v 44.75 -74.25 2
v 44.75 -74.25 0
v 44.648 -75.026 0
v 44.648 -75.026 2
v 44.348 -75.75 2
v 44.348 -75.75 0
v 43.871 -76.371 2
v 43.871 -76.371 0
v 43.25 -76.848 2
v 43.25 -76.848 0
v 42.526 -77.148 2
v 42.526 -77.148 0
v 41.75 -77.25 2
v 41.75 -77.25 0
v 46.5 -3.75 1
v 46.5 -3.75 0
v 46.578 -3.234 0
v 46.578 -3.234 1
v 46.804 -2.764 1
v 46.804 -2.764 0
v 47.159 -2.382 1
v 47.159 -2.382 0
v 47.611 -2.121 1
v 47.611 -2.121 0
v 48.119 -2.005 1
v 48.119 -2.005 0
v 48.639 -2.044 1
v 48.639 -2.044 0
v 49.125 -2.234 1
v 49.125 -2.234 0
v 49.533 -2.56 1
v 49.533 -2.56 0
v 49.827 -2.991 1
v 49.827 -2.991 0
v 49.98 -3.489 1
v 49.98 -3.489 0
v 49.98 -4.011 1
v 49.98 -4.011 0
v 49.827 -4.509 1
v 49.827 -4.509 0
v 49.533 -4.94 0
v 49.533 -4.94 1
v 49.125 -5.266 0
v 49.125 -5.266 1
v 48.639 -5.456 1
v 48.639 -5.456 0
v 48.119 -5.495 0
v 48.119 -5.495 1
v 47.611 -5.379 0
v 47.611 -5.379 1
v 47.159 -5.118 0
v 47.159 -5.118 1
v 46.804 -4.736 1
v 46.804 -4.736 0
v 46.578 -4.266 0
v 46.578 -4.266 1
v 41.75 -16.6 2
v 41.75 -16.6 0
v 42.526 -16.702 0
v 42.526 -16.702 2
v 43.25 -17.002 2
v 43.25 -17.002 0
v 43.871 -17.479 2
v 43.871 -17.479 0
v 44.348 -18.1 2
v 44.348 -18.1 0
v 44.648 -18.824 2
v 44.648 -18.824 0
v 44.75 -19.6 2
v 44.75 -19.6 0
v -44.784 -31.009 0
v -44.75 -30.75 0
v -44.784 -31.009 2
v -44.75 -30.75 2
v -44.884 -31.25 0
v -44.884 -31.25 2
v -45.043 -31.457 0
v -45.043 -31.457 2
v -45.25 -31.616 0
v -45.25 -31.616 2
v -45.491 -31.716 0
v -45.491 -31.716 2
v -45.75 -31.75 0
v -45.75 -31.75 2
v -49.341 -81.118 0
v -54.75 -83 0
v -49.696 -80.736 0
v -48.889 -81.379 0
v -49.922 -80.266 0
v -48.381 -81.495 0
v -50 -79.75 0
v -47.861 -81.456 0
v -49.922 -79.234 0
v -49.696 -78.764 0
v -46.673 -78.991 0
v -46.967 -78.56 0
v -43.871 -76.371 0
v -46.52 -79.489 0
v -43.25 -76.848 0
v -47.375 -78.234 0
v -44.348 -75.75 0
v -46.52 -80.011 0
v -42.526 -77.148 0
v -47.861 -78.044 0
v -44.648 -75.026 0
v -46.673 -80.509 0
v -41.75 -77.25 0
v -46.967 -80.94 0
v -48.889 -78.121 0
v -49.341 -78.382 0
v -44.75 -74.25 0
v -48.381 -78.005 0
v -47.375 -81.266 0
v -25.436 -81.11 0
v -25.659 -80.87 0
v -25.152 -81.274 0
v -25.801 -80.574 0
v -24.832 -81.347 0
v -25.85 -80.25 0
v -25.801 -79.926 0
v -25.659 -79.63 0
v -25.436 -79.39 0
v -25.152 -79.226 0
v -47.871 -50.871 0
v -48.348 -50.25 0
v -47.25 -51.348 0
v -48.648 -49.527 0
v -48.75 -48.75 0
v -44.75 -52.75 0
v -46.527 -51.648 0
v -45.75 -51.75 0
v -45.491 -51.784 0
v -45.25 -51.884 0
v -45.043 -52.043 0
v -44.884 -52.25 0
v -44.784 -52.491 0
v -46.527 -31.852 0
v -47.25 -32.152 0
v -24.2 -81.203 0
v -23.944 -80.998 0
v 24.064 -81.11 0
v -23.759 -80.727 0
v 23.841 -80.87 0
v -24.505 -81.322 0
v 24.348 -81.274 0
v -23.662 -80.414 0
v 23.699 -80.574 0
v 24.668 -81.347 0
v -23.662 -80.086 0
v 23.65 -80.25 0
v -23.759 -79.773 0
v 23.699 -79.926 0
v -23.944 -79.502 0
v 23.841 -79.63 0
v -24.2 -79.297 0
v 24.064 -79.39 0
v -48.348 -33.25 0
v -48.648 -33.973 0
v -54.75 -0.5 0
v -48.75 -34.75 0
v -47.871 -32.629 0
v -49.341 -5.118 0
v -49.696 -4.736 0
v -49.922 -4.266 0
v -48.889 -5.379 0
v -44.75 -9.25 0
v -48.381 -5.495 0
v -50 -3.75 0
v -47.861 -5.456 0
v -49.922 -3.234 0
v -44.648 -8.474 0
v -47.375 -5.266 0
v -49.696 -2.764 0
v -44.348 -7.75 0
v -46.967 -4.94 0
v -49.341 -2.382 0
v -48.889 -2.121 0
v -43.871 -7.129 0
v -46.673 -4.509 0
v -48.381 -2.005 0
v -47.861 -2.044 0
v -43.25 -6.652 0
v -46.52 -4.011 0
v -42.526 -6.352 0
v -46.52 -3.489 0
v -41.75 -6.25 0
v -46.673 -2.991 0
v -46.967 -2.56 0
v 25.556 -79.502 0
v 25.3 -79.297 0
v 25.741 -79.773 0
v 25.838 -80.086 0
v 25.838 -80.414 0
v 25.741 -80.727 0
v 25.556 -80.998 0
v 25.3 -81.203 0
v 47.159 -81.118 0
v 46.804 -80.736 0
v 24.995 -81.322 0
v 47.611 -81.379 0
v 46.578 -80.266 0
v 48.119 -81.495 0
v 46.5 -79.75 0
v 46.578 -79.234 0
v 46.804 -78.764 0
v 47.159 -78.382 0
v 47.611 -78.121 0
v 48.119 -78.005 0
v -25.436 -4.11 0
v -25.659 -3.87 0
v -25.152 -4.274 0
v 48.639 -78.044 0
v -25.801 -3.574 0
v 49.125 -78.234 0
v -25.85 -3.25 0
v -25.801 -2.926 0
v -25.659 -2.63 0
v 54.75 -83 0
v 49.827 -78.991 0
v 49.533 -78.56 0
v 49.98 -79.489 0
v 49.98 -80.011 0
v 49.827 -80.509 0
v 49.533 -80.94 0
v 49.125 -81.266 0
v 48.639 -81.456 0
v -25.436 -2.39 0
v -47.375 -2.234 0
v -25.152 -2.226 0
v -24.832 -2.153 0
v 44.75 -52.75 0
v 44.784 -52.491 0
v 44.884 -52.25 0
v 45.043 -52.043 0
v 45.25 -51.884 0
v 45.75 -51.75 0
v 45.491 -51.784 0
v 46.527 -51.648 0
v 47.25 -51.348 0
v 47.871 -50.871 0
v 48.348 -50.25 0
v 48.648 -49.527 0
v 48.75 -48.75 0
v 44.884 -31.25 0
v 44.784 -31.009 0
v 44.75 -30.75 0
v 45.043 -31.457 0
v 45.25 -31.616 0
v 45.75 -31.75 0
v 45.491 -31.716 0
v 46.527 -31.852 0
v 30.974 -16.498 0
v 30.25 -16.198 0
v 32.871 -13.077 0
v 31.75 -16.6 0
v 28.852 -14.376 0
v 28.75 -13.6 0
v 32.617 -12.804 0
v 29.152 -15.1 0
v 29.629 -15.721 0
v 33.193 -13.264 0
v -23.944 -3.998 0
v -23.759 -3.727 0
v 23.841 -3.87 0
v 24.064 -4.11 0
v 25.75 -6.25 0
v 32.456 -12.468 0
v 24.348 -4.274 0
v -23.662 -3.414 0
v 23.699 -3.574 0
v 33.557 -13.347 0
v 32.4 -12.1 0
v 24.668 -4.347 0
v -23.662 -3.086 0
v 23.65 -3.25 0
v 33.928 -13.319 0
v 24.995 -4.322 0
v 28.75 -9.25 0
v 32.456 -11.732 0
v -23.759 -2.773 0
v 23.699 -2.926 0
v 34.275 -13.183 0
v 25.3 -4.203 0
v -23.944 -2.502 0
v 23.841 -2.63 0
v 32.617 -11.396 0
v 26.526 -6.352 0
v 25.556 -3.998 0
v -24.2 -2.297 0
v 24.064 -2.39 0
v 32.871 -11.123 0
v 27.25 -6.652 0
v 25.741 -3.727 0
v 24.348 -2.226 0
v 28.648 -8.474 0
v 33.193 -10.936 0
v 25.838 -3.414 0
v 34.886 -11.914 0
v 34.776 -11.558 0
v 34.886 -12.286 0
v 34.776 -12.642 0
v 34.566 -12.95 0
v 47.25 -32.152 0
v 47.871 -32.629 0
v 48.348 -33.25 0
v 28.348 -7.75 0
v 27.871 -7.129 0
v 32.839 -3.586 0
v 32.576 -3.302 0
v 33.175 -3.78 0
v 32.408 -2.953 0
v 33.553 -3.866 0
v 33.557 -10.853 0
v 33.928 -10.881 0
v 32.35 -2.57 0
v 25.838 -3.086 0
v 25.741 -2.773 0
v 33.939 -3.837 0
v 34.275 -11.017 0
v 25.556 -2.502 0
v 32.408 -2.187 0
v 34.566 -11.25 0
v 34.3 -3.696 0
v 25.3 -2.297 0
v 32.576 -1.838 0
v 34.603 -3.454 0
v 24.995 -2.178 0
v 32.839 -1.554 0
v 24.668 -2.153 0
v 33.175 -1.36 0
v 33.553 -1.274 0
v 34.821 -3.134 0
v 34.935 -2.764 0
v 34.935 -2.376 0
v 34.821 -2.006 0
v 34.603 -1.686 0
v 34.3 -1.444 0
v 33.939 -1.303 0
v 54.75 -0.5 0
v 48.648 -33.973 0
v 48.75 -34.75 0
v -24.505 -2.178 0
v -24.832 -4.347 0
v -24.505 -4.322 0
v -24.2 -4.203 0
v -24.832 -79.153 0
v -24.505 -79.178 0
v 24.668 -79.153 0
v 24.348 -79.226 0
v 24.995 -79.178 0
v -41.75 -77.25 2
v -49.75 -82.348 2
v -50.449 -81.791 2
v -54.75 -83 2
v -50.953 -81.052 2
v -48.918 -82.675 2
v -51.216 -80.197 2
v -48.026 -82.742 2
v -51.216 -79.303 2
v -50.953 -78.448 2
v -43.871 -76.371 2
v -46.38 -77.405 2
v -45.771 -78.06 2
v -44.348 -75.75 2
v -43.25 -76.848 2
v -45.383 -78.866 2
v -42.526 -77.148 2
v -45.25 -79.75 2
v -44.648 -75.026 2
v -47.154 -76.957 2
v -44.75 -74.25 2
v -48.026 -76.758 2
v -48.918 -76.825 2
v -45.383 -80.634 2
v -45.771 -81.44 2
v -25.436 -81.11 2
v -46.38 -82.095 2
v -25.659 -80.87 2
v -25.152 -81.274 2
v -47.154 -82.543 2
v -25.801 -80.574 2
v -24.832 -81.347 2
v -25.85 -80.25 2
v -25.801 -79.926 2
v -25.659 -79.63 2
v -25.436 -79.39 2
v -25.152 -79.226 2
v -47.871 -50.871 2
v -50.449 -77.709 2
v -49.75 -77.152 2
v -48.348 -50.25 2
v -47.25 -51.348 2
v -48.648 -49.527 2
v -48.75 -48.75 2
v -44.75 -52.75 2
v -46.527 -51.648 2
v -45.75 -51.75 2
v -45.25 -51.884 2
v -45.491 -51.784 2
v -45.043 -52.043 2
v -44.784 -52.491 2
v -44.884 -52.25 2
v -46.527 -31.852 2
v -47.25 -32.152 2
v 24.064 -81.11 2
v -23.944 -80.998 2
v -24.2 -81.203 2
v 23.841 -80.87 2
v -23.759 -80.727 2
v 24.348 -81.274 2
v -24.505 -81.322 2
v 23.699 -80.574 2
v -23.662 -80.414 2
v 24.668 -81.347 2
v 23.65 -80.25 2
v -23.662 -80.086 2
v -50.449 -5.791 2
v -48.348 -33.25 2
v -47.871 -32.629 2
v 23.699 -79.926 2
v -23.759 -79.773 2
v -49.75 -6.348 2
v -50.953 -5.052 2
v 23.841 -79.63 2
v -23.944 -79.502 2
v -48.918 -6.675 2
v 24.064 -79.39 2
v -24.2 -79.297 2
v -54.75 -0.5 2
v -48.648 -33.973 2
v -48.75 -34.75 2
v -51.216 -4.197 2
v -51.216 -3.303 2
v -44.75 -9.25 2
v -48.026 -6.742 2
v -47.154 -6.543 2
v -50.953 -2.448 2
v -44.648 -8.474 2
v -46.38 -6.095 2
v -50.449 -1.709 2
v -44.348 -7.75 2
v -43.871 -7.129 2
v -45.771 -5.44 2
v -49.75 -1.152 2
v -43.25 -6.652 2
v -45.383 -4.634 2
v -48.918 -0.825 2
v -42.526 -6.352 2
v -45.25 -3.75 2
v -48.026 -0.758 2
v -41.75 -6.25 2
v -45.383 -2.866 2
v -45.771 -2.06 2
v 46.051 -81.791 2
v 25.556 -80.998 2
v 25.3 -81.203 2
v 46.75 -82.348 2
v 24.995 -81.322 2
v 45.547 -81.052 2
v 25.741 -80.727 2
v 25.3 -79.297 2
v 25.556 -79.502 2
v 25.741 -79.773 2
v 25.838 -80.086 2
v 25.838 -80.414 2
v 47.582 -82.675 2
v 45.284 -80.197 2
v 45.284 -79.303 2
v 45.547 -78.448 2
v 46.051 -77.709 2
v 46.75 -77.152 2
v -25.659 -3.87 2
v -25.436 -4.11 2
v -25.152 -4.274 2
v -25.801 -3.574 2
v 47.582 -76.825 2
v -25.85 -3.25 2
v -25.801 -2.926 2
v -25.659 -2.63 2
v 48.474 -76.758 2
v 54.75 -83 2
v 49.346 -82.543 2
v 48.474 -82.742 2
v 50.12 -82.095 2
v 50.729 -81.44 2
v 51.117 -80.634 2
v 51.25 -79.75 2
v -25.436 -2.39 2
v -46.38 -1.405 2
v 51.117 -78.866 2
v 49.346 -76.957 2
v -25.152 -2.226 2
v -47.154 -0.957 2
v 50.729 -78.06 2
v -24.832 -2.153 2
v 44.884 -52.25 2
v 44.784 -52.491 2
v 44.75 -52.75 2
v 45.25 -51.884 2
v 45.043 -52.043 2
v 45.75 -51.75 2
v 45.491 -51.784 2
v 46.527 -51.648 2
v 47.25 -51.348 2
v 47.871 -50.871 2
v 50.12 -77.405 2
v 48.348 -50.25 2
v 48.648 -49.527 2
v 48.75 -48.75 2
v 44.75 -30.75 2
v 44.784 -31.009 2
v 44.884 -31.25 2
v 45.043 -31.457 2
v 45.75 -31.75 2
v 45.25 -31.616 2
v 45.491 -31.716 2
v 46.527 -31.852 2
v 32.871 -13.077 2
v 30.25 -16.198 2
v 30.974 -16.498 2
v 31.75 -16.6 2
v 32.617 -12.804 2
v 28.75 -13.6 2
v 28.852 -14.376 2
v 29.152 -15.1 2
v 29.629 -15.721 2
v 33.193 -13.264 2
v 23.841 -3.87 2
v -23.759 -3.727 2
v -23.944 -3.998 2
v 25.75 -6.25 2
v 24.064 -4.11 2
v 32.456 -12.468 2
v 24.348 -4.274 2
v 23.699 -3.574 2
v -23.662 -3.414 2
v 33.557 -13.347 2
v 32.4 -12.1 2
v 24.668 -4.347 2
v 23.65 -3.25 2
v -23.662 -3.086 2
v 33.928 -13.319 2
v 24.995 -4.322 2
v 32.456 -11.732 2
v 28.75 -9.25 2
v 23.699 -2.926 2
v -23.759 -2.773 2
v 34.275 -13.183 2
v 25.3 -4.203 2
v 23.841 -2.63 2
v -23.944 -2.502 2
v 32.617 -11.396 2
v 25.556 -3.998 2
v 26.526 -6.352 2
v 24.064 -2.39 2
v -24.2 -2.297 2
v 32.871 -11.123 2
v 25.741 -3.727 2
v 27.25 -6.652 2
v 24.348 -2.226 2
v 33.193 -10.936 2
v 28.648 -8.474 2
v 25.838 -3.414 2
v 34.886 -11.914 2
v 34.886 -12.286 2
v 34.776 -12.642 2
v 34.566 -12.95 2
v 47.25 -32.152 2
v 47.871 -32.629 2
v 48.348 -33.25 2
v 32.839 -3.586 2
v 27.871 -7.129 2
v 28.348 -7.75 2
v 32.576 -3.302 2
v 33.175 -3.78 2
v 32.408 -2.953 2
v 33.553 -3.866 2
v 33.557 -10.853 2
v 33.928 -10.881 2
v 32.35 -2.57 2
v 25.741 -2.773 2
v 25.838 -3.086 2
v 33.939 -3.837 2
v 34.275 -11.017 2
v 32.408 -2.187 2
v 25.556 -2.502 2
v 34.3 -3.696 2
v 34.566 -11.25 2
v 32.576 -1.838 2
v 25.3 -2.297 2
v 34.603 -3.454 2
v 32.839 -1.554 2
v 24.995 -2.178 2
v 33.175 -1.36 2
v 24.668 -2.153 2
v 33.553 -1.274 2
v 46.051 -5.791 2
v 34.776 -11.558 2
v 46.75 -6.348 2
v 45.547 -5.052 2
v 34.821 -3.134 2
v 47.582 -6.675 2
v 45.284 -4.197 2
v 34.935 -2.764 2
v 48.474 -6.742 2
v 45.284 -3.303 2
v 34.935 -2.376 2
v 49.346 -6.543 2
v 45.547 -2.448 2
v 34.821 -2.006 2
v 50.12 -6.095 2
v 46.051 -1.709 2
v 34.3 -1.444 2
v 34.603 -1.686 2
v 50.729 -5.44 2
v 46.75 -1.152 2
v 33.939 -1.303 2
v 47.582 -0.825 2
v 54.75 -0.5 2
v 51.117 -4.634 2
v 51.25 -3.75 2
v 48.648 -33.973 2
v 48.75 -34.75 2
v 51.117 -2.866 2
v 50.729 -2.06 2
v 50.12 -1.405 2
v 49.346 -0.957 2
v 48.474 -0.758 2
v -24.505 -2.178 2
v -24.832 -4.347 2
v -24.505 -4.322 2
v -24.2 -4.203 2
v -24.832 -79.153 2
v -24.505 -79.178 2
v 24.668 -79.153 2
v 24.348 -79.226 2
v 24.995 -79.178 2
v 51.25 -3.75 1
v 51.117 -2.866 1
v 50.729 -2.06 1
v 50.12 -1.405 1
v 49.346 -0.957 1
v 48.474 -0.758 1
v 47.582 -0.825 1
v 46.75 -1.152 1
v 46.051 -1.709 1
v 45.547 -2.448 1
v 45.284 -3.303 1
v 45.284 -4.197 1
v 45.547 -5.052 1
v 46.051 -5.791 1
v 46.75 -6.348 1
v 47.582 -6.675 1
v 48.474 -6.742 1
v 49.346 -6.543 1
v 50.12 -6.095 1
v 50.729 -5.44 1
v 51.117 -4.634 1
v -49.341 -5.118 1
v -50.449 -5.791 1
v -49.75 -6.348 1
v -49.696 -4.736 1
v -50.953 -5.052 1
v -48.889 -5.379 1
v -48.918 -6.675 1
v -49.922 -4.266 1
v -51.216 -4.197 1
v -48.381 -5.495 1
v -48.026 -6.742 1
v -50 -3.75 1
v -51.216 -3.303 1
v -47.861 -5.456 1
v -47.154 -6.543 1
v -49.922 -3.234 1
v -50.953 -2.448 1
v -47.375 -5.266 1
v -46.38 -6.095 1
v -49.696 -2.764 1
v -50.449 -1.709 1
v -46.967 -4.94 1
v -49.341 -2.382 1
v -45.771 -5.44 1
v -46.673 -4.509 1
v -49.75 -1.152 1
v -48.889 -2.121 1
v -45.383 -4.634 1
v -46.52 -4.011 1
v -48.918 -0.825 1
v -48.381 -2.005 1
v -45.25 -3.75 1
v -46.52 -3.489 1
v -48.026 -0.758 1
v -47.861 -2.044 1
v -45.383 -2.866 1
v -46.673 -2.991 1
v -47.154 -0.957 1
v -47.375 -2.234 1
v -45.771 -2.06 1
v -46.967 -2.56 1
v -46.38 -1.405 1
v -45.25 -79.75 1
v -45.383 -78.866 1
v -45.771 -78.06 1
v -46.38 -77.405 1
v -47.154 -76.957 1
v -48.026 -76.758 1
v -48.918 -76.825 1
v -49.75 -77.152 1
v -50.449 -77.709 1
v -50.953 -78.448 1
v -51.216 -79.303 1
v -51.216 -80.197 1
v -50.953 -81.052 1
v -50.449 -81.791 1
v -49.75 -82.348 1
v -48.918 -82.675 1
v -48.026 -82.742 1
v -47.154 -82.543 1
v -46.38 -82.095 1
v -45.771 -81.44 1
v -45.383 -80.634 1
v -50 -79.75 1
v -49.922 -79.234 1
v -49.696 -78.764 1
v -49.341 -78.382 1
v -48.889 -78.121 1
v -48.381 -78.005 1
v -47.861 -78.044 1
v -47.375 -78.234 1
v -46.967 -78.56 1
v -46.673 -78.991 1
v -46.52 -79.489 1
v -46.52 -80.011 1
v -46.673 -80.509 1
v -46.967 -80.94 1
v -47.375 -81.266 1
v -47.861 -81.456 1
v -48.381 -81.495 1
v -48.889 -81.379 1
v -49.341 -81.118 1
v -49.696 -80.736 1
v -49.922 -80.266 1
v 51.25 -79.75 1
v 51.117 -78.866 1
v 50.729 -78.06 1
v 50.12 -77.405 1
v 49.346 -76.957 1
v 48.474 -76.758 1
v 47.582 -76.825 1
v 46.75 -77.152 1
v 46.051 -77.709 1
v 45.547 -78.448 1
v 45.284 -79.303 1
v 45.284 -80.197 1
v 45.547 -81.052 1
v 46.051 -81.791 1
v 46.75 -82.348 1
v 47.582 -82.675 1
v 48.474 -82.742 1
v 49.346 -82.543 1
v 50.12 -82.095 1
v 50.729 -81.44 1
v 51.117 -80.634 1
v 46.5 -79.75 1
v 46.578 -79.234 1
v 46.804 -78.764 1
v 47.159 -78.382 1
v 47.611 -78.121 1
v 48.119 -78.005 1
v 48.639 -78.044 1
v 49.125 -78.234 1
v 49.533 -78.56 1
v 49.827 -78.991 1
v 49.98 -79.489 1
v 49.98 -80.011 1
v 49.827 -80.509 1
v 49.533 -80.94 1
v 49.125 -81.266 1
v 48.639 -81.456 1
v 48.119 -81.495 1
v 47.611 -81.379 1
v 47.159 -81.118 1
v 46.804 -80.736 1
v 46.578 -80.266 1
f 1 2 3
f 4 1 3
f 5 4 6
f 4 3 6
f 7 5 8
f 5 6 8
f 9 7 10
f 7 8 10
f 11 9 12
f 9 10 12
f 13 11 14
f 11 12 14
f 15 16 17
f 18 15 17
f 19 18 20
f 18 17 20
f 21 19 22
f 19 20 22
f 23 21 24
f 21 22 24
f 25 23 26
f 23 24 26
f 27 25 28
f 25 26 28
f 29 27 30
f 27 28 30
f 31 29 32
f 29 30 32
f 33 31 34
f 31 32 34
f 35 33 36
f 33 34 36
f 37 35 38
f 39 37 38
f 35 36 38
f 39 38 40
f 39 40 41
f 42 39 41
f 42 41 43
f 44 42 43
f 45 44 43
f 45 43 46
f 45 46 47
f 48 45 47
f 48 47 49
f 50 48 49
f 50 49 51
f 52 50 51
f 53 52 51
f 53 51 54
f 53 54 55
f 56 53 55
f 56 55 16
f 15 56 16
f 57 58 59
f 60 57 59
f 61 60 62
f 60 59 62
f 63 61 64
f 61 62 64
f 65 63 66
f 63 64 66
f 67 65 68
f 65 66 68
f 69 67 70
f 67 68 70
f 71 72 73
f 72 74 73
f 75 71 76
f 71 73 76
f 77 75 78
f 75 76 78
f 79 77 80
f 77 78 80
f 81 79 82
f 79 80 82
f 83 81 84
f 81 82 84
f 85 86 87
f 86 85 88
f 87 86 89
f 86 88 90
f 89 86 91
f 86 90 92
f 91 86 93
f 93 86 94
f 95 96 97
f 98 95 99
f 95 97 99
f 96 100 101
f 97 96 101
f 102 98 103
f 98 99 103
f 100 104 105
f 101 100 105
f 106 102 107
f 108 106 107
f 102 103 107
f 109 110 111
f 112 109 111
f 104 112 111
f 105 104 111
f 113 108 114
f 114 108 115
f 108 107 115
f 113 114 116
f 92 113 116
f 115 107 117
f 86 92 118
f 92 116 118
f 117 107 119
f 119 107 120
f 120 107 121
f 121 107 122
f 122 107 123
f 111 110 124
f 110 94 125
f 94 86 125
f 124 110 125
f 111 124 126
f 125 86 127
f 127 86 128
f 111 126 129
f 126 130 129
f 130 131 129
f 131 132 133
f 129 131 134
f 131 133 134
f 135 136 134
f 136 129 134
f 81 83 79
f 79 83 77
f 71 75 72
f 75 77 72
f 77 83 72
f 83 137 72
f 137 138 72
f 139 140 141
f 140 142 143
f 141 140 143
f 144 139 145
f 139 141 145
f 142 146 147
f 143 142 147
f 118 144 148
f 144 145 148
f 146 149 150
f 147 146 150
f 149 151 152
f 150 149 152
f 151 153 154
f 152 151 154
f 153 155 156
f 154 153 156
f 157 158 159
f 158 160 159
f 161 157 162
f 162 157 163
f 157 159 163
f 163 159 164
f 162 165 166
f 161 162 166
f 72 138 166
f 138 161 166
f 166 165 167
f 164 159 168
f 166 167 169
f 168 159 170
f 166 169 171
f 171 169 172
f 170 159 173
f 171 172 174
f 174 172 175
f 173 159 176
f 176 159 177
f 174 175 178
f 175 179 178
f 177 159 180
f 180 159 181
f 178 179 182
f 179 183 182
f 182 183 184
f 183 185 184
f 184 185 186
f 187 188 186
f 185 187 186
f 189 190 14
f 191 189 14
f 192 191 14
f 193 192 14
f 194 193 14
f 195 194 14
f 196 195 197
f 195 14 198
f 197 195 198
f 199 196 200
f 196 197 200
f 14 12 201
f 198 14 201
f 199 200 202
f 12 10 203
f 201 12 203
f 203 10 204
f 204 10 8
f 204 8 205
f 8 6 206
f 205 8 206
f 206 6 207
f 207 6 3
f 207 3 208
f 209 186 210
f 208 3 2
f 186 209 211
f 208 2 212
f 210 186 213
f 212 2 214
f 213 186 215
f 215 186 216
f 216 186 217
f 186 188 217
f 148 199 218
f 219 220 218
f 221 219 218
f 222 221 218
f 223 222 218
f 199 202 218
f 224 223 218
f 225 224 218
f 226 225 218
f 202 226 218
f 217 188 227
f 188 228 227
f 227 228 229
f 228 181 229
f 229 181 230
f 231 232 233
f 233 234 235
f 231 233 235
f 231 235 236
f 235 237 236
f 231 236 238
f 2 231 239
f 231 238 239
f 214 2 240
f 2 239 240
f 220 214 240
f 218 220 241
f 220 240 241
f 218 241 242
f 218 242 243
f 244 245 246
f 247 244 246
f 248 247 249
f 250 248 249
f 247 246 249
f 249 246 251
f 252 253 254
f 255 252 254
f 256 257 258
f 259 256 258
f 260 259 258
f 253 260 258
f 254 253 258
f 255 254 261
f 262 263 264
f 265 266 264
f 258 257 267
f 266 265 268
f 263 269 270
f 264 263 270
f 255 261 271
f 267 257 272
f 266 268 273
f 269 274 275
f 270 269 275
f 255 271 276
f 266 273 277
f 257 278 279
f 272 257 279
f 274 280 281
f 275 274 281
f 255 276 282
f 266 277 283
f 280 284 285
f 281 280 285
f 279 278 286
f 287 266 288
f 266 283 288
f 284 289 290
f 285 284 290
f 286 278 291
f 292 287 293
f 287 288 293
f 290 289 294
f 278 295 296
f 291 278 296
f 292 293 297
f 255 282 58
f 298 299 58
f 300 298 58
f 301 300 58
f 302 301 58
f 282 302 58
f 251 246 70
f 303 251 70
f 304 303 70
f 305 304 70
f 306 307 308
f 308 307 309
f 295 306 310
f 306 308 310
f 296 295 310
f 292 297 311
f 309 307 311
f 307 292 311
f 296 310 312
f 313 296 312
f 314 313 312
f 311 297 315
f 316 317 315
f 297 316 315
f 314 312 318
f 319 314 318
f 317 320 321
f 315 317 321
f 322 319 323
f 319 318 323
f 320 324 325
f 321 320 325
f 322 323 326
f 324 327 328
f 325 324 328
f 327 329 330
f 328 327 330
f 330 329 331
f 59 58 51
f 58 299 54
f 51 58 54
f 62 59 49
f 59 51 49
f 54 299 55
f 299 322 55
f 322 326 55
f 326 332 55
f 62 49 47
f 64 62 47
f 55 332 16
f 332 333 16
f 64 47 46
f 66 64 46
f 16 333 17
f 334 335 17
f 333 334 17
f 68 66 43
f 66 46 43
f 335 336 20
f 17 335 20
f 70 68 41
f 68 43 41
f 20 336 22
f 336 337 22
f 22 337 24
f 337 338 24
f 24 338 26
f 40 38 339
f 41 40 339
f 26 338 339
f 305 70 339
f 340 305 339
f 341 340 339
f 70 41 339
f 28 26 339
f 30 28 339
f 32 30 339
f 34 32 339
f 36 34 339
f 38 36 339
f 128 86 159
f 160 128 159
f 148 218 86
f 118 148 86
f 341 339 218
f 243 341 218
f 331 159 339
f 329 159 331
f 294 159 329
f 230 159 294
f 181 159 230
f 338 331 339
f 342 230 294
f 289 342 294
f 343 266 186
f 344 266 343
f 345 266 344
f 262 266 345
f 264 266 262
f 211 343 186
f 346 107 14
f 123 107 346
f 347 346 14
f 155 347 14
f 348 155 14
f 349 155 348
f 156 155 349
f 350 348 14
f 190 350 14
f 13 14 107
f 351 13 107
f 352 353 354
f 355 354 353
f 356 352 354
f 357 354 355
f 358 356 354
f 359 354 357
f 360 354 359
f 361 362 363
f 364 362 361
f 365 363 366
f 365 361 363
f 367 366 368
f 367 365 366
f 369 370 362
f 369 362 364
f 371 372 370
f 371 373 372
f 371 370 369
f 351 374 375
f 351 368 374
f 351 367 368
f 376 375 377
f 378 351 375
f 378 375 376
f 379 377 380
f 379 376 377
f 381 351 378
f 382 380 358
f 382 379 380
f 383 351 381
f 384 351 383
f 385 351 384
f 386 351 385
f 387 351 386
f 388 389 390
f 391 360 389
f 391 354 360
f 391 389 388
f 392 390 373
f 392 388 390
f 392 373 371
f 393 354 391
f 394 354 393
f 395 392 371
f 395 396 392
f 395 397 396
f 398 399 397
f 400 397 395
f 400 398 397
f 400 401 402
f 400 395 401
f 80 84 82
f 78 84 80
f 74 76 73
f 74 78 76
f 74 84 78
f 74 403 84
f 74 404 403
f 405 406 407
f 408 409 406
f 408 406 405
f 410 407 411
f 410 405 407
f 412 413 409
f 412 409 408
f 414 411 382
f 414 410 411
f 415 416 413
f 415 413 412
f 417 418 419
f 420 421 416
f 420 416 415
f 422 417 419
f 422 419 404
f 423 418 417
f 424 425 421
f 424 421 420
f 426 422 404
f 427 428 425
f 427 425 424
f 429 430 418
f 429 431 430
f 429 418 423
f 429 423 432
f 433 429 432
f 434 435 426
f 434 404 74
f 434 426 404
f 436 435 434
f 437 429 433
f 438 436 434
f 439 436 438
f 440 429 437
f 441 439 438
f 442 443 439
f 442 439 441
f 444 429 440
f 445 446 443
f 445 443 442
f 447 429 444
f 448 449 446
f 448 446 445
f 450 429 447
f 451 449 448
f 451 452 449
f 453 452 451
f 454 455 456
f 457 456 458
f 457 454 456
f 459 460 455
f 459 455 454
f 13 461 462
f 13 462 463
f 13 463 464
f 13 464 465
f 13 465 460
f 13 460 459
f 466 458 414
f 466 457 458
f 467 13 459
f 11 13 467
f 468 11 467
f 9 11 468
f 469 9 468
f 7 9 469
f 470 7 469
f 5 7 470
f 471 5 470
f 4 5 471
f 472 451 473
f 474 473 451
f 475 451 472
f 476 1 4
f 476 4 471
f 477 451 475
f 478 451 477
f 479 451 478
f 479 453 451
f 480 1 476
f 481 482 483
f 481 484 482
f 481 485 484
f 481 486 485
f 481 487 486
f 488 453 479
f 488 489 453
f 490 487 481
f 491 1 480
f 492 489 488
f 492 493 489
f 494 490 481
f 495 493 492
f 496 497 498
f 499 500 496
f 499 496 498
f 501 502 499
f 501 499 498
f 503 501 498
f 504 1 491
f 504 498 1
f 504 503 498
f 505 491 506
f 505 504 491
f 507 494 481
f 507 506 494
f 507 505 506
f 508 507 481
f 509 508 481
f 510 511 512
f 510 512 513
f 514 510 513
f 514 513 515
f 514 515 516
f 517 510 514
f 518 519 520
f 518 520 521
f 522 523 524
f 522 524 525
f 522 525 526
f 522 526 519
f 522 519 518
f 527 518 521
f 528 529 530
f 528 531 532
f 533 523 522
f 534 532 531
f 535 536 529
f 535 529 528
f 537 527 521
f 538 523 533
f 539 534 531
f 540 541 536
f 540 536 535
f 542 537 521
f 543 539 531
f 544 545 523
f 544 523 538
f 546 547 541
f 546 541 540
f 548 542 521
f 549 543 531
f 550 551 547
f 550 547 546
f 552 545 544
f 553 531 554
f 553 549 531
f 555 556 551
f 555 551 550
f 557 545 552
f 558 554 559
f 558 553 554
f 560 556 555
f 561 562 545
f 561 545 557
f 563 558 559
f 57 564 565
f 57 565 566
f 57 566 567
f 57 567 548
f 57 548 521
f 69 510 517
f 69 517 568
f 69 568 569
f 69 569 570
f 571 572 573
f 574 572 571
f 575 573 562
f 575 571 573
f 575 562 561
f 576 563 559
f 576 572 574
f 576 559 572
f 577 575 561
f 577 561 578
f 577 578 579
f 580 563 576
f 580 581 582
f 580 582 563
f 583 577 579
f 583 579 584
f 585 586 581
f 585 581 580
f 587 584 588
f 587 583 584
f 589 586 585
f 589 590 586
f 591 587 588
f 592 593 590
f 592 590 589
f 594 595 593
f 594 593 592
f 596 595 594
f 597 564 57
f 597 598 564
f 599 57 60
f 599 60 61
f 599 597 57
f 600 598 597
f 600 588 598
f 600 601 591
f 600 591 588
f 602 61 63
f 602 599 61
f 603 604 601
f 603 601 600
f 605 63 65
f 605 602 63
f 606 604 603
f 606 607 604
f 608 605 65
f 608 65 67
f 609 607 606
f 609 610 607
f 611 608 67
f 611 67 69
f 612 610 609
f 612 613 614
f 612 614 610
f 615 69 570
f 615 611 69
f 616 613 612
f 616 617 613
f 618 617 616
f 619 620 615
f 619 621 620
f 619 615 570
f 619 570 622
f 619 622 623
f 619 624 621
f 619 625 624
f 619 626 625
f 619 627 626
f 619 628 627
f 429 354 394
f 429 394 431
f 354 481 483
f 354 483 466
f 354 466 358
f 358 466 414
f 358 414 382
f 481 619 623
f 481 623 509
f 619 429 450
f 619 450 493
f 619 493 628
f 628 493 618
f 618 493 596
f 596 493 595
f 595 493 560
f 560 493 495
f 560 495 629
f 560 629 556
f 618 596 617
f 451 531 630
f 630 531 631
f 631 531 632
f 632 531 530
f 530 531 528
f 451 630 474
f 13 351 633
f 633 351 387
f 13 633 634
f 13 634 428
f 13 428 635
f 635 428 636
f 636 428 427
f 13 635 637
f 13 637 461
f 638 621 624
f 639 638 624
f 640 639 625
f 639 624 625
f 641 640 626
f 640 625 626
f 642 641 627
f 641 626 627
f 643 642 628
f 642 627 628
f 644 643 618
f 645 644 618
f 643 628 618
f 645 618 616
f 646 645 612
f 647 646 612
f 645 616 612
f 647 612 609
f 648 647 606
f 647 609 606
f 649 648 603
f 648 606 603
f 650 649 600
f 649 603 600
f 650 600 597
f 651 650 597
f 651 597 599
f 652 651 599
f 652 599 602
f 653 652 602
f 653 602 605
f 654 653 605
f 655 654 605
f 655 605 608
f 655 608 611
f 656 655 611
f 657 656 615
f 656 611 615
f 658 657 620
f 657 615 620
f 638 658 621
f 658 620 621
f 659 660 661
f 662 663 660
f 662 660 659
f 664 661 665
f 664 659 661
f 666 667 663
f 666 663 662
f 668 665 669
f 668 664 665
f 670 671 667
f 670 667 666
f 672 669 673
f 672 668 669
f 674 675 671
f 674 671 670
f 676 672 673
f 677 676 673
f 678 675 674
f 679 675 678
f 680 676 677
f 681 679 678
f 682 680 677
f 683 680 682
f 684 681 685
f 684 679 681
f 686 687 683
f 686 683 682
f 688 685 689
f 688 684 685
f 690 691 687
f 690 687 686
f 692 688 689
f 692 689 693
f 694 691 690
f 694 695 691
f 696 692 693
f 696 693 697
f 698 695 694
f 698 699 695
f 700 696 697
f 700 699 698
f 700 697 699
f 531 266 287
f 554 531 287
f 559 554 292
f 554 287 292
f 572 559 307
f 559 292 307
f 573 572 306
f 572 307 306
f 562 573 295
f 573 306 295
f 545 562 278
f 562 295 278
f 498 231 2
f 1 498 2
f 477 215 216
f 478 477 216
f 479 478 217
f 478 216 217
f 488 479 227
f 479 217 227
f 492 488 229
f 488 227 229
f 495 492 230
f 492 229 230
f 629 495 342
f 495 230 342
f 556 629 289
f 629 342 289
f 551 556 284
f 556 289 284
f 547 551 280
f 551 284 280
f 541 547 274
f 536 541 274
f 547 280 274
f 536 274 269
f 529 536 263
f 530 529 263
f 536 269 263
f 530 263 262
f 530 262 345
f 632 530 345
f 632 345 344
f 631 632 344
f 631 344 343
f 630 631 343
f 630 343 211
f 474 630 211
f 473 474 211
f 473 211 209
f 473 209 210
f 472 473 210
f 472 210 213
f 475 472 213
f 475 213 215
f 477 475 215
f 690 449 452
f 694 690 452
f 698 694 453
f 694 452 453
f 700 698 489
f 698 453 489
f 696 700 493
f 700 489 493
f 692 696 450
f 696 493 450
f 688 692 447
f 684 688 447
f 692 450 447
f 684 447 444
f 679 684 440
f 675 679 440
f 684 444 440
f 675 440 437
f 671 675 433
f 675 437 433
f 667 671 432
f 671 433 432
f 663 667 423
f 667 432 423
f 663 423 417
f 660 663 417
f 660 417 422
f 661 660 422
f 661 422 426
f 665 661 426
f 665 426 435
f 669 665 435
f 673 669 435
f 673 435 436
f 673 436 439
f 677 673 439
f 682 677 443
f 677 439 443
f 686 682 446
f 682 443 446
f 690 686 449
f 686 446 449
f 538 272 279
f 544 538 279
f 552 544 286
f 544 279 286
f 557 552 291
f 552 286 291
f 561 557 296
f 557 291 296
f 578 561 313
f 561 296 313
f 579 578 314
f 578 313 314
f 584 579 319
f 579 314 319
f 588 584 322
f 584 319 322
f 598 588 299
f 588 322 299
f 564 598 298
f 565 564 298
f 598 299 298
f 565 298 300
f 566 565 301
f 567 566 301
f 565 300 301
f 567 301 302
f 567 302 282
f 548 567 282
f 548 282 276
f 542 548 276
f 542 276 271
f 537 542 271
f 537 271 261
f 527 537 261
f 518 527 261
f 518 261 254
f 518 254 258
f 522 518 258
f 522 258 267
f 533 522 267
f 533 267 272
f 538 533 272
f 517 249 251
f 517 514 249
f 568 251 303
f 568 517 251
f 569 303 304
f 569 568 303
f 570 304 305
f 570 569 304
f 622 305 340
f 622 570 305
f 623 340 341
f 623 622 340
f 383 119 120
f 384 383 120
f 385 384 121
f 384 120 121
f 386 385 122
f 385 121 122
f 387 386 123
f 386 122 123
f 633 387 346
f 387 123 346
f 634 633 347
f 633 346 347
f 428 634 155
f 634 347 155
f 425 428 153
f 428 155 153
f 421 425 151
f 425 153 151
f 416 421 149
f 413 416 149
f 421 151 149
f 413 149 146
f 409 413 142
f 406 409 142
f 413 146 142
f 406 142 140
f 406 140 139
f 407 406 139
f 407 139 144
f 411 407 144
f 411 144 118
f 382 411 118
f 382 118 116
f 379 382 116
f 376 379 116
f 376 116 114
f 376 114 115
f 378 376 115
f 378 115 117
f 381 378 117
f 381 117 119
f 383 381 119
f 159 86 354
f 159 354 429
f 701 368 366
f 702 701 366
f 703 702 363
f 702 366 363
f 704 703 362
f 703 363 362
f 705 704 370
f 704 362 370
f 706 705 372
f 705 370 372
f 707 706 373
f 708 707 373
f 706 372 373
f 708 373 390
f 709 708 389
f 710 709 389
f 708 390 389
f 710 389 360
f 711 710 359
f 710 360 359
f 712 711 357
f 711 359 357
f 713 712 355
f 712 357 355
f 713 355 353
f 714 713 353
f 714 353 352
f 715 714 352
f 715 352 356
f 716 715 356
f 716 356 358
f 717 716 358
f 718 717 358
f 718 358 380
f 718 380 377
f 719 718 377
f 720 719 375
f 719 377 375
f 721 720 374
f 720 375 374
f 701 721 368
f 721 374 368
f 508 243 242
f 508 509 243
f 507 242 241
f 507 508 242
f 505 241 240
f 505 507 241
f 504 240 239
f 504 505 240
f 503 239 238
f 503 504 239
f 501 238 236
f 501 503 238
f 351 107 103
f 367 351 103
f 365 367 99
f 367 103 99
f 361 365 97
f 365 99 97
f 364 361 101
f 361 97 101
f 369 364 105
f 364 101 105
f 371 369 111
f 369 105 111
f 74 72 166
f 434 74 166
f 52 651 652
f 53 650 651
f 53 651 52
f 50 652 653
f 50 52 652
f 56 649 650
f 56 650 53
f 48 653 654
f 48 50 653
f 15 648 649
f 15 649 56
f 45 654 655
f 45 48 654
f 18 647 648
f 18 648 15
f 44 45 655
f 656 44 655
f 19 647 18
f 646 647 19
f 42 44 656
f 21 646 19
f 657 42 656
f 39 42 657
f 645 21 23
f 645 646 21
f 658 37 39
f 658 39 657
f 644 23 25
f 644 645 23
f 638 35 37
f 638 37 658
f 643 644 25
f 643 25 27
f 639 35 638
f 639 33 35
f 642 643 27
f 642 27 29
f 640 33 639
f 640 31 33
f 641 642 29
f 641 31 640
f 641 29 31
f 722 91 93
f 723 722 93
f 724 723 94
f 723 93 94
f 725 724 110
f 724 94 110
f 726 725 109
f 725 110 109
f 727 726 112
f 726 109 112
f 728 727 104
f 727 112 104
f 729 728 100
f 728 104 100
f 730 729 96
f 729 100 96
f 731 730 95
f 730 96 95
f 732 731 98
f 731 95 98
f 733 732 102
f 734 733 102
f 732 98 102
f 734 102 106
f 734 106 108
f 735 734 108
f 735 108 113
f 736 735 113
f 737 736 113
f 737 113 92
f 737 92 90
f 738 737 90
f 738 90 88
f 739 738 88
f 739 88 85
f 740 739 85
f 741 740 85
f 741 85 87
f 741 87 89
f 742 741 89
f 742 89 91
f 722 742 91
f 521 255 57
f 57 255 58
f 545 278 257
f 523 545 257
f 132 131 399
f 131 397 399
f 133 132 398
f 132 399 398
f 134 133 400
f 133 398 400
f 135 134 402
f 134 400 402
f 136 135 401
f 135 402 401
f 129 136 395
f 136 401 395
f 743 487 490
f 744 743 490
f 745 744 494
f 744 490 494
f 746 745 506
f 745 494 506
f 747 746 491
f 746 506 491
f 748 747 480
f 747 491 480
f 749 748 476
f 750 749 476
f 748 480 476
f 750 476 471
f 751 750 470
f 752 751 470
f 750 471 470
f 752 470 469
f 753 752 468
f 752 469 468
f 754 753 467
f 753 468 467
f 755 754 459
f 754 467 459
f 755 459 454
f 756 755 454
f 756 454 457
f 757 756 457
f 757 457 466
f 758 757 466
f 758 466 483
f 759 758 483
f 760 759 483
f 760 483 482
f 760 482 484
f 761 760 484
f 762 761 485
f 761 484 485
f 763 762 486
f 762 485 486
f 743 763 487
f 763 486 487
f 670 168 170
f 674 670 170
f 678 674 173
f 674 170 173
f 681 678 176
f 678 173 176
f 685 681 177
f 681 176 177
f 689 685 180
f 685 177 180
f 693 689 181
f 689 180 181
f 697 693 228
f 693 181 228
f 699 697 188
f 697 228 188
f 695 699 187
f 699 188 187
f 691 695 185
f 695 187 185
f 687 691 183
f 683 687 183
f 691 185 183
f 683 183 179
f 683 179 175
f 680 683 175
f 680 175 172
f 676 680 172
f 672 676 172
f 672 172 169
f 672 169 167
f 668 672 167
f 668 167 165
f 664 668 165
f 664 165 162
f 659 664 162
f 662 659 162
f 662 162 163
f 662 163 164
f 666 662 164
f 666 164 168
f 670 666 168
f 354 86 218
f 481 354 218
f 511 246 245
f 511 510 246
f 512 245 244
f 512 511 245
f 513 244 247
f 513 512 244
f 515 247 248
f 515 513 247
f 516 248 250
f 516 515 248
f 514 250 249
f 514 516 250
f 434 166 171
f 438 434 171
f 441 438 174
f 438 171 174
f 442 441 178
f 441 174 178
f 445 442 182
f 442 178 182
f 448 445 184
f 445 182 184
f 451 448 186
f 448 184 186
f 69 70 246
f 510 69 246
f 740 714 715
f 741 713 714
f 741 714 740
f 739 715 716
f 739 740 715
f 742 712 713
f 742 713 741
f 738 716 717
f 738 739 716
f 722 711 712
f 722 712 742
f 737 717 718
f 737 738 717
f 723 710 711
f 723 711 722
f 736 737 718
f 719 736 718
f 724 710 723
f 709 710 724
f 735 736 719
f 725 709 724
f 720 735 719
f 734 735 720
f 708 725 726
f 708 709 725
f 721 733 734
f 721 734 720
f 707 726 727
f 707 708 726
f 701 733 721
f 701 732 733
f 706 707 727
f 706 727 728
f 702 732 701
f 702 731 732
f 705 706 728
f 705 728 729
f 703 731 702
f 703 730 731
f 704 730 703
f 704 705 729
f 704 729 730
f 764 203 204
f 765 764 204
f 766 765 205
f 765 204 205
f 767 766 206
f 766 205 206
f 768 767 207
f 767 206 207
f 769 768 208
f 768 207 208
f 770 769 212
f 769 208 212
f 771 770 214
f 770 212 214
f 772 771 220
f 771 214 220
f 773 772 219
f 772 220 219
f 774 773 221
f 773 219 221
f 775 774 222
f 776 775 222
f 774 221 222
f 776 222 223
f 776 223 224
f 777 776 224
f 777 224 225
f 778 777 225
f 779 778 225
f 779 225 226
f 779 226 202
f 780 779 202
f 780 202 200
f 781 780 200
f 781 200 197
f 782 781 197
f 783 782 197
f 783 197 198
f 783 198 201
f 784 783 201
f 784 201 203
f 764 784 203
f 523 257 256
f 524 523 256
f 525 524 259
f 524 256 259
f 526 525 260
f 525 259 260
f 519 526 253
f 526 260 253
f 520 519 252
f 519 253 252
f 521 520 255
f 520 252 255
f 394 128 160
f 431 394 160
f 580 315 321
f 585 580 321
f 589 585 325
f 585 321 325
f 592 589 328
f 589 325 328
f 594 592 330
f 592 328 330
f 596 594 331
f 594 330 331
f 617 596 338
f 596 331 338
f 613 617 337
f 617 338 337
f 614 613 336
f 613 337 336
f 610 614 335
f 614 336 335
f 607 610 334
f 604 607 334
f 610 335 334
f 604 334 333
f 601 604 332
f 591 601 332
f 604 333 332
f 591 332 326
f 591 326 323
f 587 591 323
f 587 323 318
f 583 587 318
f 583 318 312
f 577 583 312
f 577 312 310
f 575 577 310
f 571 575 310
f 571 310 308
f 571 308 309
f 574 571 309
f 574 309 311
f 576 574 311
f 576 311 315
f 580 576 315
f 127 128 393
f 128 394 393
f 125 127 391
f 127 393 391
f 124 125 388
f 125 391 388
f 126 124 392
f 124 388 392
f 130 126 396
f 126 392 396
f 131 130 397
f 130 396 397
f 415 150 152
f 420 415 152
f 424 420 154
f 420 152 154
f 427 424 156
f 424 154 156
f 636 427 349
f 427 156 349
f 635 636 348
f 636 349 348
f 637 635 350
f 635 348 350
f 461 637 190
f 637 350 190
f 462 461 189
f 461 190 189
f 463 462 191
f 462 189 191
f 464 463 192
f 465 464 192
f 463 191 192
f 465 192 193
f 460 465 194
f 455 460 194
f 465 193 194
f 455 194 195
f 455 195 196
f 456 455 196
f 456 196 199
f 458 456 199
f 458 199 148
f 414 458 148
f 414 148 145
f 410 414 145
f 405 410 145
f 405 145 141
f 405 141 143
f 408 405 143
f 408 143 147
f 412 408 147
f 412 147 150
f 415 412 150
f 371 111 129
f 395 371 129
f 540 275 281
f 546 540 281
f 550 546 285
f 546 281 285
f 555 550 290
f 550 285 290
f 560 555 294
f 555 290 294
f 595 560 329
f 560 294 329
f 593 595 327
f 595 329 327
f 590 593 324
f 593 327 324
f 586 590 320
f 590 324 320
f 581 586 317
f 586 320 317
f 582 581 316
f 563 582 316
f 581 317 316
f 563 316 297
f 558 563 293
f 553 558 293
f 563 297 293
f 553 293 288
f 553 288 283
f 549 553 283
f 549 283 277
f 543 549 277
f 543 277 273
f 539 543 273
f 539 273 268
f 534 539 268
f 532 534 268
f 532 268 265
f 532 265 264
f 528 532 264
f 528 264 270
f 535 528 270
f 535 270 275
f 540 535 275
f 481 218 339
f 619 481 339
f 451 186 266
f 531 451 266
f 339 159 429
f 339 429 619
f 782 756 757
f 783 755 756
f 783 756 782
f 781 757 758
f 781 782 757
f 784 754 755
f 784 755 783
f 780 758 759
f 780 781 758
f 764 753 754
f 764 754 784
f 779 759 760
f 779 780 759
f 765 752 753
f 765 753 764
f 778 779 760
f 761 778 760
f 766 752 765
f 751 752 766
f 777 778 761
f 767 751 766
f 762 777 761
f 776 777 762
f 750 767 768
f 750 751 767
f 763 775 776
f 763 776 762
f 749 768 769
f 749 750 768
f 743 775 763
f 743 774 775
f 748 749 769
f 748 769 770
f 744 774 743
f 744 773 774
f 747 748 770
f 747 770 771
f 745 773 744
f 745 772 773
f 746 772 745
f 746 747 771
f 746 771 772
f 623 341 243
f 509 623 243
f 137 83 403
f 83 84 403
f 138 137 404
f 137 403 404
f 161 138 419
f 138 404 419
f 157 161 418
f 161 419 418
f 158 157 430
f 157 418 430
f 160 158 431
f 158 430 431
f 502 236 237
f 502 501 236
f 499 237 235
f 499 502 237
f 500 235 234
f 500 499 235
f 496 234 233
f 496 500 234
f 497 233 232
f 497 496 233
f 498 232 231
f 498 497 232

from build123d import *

# Parameters (mm, degrees)
SKETCH1_W                  = 109.5
SKETCH1_H                  = 82.5
BOSS_EXTRUDE1_DEPTH        = 2
F_3_5_3_5_DIAMETER_HOLE1_D = 3.5
F_2_5_2_5_DIAMETER_HOLE1_D = 2.5
F_2_6_2_6_DIAMETER_HOLE1_D = 2.6
SKETCH9_R                  = 3
CUT_EXTRUDE1_DEPTH         = 1
F_2_2_2_2_DIAMETER_HOLE1_D = 2.2
FILLET1_R                  = 1
FILLET2_R                  = 3


with BuildPart() as part:
    # Sketch1 → Boss-Extrude1 (new body)
    with BuildSketch(Plane.XY):
        with Locations((0, -41.75)):
            Rectangle(SKETCH1_W, SKETCH1_H)
        with BuildLine():
            Line((28.75, -9.25), (28.75, -13.6))
            ThreePointArc((28.75, -13.6), (29.628679656, -15.721320344), (31.75, -16.6))
            Line((31.75, -16.6), (41.75, -16.6))
            ThreePointArc((41.75, -16.6), (43.871320344, -17.478679656), (44.75, -19.6))
            Line((44.75, -19.6), (44.75, -31.75))
            Line((44.75, -31.75), (48.75, -31.75))
            Line((48.75, -31.75), (48.75, -41.75))
            Line((48.75, -41.75), (48.75, -51.75))
            Line((48.75, -51.75), (44.75, -51.75))
            Line((44.75, -51.75), (44.75, -74.25))
            ThreePointArc((44.75, -74.25), (43.871320344, -76.371320344), (41.75, -77.25))
            Line((41.75, -77.25), (-41.75, -77.25))
            ThreePointArc((-41.75, -77.25), (-43.871320344, -76.371320344), (-44.75, -74.25))
            Line((-44.75, -74.25), (-44.75, -51.75))
            Line((-44.75, -51.75), (-48.75, -51.75))
            Line((-48.75, -51.75), (-48.75, -31.75))
            Line((-48.75, -31.75), (-44.75, -31.75))
            Line((-44.75, -31.75), (-44.75, -9.25))
            ThreePointArc((-44.75, -9.25), (-43.871320344, -7.128679656), (-41.75, -6.25))
            Line((-41.75, -6.25), (25.75, -6.25))
            ThreePointArc((25.75, -6.25), (27.871320344, -7.128679656), (28.75, -9.25))
        make_face(mode=Mode.SUBTRACT)
    extrude(amount=BOSS_EXTRUDE1_DEPTH)

    # Ø3.5 (3.5) Diameter Hole1 (through all)
    with Locations(Plane.XY.offset(2)):
        with Locations((-48.25, -3.75), (-48.25, -79.75), (48.25, -79.75), (48.25, -3.75)):
            Hole(F_3_5_3_5_DIAMETER_HOLE1_D / 2)

    # Ø2.5 (2.5) Diameter Hole1 (through all)
    with Locations(Plane.XY.offset(2)):
        with Locations((33.65, -12.1)):
            Hole(F_2_5_2_5_DIAMETER_HOLE1_D / 2)

    # Ø2.6 (2.6) Diameter Hole1 (through all)
    with Locations(Plane.XY.offset(2)):
        with Locations((33.65, -2.57)):
            Hole(F_2_6_2_6_DIAMETER_HOLE1_D / 2)

    # Sketch9 → Cut-Extrude1 (cut)
    with BuildSketch(Plane.XY.offset(2)):
        with Locations((-48.25, -3.75)):
            Circle(SKETCH9_R)
        with Locations((48.25, -3.75)):
            Circle(SKETCH9_R)
        with Locations((48.25, -79.75)):
            Circle(SKETCH9_R)
        with Locations((-48.25, -79.75)):
            Circle(SKETCH9_R)
    extrude(amount=-CUT_EXTRUDE1_DEPTH, mode=Mode.SUBTRACT)

    # Ø2.2 (2.2) Diameter Hole1 (through all)
    with Locations(Plane.XY.offset(2)):
        with Locations((-24.75, -3.25), (24.75, -3.25), (-24.75, -80.25), (24.75, -80.25)):
            Hole(F_2_2_2_2_DIAMETER_HOLE1_D / 2)

    # Fillet1
    fillet1_edges = [part.edges().sort_by_distance(p)[0] for p in [
        (-44.75, -31.75, 1),
        (-44.75, -51.75, 1),
        (44.75, -51.75, 1),
        (44.75, -31.75, 1),
    ]]
    fillet(fillet1_edges, radius=FILLET1_R)

    # Fillet2
    fillet2_edges = [part.edges().sort_by_distance(p)[0] for p in [
        (48.75, -31.75, 1),
        (48.75, -51.75, 1),
        (-48.75, -51.75, 1),
        (-48.75, -31.75, 1),
    ]]
    fillet(fillet2_edges, radius=FILLET2_R - 0.0001)  # a hair under: the kernel refuses the full size


solid = part.part
